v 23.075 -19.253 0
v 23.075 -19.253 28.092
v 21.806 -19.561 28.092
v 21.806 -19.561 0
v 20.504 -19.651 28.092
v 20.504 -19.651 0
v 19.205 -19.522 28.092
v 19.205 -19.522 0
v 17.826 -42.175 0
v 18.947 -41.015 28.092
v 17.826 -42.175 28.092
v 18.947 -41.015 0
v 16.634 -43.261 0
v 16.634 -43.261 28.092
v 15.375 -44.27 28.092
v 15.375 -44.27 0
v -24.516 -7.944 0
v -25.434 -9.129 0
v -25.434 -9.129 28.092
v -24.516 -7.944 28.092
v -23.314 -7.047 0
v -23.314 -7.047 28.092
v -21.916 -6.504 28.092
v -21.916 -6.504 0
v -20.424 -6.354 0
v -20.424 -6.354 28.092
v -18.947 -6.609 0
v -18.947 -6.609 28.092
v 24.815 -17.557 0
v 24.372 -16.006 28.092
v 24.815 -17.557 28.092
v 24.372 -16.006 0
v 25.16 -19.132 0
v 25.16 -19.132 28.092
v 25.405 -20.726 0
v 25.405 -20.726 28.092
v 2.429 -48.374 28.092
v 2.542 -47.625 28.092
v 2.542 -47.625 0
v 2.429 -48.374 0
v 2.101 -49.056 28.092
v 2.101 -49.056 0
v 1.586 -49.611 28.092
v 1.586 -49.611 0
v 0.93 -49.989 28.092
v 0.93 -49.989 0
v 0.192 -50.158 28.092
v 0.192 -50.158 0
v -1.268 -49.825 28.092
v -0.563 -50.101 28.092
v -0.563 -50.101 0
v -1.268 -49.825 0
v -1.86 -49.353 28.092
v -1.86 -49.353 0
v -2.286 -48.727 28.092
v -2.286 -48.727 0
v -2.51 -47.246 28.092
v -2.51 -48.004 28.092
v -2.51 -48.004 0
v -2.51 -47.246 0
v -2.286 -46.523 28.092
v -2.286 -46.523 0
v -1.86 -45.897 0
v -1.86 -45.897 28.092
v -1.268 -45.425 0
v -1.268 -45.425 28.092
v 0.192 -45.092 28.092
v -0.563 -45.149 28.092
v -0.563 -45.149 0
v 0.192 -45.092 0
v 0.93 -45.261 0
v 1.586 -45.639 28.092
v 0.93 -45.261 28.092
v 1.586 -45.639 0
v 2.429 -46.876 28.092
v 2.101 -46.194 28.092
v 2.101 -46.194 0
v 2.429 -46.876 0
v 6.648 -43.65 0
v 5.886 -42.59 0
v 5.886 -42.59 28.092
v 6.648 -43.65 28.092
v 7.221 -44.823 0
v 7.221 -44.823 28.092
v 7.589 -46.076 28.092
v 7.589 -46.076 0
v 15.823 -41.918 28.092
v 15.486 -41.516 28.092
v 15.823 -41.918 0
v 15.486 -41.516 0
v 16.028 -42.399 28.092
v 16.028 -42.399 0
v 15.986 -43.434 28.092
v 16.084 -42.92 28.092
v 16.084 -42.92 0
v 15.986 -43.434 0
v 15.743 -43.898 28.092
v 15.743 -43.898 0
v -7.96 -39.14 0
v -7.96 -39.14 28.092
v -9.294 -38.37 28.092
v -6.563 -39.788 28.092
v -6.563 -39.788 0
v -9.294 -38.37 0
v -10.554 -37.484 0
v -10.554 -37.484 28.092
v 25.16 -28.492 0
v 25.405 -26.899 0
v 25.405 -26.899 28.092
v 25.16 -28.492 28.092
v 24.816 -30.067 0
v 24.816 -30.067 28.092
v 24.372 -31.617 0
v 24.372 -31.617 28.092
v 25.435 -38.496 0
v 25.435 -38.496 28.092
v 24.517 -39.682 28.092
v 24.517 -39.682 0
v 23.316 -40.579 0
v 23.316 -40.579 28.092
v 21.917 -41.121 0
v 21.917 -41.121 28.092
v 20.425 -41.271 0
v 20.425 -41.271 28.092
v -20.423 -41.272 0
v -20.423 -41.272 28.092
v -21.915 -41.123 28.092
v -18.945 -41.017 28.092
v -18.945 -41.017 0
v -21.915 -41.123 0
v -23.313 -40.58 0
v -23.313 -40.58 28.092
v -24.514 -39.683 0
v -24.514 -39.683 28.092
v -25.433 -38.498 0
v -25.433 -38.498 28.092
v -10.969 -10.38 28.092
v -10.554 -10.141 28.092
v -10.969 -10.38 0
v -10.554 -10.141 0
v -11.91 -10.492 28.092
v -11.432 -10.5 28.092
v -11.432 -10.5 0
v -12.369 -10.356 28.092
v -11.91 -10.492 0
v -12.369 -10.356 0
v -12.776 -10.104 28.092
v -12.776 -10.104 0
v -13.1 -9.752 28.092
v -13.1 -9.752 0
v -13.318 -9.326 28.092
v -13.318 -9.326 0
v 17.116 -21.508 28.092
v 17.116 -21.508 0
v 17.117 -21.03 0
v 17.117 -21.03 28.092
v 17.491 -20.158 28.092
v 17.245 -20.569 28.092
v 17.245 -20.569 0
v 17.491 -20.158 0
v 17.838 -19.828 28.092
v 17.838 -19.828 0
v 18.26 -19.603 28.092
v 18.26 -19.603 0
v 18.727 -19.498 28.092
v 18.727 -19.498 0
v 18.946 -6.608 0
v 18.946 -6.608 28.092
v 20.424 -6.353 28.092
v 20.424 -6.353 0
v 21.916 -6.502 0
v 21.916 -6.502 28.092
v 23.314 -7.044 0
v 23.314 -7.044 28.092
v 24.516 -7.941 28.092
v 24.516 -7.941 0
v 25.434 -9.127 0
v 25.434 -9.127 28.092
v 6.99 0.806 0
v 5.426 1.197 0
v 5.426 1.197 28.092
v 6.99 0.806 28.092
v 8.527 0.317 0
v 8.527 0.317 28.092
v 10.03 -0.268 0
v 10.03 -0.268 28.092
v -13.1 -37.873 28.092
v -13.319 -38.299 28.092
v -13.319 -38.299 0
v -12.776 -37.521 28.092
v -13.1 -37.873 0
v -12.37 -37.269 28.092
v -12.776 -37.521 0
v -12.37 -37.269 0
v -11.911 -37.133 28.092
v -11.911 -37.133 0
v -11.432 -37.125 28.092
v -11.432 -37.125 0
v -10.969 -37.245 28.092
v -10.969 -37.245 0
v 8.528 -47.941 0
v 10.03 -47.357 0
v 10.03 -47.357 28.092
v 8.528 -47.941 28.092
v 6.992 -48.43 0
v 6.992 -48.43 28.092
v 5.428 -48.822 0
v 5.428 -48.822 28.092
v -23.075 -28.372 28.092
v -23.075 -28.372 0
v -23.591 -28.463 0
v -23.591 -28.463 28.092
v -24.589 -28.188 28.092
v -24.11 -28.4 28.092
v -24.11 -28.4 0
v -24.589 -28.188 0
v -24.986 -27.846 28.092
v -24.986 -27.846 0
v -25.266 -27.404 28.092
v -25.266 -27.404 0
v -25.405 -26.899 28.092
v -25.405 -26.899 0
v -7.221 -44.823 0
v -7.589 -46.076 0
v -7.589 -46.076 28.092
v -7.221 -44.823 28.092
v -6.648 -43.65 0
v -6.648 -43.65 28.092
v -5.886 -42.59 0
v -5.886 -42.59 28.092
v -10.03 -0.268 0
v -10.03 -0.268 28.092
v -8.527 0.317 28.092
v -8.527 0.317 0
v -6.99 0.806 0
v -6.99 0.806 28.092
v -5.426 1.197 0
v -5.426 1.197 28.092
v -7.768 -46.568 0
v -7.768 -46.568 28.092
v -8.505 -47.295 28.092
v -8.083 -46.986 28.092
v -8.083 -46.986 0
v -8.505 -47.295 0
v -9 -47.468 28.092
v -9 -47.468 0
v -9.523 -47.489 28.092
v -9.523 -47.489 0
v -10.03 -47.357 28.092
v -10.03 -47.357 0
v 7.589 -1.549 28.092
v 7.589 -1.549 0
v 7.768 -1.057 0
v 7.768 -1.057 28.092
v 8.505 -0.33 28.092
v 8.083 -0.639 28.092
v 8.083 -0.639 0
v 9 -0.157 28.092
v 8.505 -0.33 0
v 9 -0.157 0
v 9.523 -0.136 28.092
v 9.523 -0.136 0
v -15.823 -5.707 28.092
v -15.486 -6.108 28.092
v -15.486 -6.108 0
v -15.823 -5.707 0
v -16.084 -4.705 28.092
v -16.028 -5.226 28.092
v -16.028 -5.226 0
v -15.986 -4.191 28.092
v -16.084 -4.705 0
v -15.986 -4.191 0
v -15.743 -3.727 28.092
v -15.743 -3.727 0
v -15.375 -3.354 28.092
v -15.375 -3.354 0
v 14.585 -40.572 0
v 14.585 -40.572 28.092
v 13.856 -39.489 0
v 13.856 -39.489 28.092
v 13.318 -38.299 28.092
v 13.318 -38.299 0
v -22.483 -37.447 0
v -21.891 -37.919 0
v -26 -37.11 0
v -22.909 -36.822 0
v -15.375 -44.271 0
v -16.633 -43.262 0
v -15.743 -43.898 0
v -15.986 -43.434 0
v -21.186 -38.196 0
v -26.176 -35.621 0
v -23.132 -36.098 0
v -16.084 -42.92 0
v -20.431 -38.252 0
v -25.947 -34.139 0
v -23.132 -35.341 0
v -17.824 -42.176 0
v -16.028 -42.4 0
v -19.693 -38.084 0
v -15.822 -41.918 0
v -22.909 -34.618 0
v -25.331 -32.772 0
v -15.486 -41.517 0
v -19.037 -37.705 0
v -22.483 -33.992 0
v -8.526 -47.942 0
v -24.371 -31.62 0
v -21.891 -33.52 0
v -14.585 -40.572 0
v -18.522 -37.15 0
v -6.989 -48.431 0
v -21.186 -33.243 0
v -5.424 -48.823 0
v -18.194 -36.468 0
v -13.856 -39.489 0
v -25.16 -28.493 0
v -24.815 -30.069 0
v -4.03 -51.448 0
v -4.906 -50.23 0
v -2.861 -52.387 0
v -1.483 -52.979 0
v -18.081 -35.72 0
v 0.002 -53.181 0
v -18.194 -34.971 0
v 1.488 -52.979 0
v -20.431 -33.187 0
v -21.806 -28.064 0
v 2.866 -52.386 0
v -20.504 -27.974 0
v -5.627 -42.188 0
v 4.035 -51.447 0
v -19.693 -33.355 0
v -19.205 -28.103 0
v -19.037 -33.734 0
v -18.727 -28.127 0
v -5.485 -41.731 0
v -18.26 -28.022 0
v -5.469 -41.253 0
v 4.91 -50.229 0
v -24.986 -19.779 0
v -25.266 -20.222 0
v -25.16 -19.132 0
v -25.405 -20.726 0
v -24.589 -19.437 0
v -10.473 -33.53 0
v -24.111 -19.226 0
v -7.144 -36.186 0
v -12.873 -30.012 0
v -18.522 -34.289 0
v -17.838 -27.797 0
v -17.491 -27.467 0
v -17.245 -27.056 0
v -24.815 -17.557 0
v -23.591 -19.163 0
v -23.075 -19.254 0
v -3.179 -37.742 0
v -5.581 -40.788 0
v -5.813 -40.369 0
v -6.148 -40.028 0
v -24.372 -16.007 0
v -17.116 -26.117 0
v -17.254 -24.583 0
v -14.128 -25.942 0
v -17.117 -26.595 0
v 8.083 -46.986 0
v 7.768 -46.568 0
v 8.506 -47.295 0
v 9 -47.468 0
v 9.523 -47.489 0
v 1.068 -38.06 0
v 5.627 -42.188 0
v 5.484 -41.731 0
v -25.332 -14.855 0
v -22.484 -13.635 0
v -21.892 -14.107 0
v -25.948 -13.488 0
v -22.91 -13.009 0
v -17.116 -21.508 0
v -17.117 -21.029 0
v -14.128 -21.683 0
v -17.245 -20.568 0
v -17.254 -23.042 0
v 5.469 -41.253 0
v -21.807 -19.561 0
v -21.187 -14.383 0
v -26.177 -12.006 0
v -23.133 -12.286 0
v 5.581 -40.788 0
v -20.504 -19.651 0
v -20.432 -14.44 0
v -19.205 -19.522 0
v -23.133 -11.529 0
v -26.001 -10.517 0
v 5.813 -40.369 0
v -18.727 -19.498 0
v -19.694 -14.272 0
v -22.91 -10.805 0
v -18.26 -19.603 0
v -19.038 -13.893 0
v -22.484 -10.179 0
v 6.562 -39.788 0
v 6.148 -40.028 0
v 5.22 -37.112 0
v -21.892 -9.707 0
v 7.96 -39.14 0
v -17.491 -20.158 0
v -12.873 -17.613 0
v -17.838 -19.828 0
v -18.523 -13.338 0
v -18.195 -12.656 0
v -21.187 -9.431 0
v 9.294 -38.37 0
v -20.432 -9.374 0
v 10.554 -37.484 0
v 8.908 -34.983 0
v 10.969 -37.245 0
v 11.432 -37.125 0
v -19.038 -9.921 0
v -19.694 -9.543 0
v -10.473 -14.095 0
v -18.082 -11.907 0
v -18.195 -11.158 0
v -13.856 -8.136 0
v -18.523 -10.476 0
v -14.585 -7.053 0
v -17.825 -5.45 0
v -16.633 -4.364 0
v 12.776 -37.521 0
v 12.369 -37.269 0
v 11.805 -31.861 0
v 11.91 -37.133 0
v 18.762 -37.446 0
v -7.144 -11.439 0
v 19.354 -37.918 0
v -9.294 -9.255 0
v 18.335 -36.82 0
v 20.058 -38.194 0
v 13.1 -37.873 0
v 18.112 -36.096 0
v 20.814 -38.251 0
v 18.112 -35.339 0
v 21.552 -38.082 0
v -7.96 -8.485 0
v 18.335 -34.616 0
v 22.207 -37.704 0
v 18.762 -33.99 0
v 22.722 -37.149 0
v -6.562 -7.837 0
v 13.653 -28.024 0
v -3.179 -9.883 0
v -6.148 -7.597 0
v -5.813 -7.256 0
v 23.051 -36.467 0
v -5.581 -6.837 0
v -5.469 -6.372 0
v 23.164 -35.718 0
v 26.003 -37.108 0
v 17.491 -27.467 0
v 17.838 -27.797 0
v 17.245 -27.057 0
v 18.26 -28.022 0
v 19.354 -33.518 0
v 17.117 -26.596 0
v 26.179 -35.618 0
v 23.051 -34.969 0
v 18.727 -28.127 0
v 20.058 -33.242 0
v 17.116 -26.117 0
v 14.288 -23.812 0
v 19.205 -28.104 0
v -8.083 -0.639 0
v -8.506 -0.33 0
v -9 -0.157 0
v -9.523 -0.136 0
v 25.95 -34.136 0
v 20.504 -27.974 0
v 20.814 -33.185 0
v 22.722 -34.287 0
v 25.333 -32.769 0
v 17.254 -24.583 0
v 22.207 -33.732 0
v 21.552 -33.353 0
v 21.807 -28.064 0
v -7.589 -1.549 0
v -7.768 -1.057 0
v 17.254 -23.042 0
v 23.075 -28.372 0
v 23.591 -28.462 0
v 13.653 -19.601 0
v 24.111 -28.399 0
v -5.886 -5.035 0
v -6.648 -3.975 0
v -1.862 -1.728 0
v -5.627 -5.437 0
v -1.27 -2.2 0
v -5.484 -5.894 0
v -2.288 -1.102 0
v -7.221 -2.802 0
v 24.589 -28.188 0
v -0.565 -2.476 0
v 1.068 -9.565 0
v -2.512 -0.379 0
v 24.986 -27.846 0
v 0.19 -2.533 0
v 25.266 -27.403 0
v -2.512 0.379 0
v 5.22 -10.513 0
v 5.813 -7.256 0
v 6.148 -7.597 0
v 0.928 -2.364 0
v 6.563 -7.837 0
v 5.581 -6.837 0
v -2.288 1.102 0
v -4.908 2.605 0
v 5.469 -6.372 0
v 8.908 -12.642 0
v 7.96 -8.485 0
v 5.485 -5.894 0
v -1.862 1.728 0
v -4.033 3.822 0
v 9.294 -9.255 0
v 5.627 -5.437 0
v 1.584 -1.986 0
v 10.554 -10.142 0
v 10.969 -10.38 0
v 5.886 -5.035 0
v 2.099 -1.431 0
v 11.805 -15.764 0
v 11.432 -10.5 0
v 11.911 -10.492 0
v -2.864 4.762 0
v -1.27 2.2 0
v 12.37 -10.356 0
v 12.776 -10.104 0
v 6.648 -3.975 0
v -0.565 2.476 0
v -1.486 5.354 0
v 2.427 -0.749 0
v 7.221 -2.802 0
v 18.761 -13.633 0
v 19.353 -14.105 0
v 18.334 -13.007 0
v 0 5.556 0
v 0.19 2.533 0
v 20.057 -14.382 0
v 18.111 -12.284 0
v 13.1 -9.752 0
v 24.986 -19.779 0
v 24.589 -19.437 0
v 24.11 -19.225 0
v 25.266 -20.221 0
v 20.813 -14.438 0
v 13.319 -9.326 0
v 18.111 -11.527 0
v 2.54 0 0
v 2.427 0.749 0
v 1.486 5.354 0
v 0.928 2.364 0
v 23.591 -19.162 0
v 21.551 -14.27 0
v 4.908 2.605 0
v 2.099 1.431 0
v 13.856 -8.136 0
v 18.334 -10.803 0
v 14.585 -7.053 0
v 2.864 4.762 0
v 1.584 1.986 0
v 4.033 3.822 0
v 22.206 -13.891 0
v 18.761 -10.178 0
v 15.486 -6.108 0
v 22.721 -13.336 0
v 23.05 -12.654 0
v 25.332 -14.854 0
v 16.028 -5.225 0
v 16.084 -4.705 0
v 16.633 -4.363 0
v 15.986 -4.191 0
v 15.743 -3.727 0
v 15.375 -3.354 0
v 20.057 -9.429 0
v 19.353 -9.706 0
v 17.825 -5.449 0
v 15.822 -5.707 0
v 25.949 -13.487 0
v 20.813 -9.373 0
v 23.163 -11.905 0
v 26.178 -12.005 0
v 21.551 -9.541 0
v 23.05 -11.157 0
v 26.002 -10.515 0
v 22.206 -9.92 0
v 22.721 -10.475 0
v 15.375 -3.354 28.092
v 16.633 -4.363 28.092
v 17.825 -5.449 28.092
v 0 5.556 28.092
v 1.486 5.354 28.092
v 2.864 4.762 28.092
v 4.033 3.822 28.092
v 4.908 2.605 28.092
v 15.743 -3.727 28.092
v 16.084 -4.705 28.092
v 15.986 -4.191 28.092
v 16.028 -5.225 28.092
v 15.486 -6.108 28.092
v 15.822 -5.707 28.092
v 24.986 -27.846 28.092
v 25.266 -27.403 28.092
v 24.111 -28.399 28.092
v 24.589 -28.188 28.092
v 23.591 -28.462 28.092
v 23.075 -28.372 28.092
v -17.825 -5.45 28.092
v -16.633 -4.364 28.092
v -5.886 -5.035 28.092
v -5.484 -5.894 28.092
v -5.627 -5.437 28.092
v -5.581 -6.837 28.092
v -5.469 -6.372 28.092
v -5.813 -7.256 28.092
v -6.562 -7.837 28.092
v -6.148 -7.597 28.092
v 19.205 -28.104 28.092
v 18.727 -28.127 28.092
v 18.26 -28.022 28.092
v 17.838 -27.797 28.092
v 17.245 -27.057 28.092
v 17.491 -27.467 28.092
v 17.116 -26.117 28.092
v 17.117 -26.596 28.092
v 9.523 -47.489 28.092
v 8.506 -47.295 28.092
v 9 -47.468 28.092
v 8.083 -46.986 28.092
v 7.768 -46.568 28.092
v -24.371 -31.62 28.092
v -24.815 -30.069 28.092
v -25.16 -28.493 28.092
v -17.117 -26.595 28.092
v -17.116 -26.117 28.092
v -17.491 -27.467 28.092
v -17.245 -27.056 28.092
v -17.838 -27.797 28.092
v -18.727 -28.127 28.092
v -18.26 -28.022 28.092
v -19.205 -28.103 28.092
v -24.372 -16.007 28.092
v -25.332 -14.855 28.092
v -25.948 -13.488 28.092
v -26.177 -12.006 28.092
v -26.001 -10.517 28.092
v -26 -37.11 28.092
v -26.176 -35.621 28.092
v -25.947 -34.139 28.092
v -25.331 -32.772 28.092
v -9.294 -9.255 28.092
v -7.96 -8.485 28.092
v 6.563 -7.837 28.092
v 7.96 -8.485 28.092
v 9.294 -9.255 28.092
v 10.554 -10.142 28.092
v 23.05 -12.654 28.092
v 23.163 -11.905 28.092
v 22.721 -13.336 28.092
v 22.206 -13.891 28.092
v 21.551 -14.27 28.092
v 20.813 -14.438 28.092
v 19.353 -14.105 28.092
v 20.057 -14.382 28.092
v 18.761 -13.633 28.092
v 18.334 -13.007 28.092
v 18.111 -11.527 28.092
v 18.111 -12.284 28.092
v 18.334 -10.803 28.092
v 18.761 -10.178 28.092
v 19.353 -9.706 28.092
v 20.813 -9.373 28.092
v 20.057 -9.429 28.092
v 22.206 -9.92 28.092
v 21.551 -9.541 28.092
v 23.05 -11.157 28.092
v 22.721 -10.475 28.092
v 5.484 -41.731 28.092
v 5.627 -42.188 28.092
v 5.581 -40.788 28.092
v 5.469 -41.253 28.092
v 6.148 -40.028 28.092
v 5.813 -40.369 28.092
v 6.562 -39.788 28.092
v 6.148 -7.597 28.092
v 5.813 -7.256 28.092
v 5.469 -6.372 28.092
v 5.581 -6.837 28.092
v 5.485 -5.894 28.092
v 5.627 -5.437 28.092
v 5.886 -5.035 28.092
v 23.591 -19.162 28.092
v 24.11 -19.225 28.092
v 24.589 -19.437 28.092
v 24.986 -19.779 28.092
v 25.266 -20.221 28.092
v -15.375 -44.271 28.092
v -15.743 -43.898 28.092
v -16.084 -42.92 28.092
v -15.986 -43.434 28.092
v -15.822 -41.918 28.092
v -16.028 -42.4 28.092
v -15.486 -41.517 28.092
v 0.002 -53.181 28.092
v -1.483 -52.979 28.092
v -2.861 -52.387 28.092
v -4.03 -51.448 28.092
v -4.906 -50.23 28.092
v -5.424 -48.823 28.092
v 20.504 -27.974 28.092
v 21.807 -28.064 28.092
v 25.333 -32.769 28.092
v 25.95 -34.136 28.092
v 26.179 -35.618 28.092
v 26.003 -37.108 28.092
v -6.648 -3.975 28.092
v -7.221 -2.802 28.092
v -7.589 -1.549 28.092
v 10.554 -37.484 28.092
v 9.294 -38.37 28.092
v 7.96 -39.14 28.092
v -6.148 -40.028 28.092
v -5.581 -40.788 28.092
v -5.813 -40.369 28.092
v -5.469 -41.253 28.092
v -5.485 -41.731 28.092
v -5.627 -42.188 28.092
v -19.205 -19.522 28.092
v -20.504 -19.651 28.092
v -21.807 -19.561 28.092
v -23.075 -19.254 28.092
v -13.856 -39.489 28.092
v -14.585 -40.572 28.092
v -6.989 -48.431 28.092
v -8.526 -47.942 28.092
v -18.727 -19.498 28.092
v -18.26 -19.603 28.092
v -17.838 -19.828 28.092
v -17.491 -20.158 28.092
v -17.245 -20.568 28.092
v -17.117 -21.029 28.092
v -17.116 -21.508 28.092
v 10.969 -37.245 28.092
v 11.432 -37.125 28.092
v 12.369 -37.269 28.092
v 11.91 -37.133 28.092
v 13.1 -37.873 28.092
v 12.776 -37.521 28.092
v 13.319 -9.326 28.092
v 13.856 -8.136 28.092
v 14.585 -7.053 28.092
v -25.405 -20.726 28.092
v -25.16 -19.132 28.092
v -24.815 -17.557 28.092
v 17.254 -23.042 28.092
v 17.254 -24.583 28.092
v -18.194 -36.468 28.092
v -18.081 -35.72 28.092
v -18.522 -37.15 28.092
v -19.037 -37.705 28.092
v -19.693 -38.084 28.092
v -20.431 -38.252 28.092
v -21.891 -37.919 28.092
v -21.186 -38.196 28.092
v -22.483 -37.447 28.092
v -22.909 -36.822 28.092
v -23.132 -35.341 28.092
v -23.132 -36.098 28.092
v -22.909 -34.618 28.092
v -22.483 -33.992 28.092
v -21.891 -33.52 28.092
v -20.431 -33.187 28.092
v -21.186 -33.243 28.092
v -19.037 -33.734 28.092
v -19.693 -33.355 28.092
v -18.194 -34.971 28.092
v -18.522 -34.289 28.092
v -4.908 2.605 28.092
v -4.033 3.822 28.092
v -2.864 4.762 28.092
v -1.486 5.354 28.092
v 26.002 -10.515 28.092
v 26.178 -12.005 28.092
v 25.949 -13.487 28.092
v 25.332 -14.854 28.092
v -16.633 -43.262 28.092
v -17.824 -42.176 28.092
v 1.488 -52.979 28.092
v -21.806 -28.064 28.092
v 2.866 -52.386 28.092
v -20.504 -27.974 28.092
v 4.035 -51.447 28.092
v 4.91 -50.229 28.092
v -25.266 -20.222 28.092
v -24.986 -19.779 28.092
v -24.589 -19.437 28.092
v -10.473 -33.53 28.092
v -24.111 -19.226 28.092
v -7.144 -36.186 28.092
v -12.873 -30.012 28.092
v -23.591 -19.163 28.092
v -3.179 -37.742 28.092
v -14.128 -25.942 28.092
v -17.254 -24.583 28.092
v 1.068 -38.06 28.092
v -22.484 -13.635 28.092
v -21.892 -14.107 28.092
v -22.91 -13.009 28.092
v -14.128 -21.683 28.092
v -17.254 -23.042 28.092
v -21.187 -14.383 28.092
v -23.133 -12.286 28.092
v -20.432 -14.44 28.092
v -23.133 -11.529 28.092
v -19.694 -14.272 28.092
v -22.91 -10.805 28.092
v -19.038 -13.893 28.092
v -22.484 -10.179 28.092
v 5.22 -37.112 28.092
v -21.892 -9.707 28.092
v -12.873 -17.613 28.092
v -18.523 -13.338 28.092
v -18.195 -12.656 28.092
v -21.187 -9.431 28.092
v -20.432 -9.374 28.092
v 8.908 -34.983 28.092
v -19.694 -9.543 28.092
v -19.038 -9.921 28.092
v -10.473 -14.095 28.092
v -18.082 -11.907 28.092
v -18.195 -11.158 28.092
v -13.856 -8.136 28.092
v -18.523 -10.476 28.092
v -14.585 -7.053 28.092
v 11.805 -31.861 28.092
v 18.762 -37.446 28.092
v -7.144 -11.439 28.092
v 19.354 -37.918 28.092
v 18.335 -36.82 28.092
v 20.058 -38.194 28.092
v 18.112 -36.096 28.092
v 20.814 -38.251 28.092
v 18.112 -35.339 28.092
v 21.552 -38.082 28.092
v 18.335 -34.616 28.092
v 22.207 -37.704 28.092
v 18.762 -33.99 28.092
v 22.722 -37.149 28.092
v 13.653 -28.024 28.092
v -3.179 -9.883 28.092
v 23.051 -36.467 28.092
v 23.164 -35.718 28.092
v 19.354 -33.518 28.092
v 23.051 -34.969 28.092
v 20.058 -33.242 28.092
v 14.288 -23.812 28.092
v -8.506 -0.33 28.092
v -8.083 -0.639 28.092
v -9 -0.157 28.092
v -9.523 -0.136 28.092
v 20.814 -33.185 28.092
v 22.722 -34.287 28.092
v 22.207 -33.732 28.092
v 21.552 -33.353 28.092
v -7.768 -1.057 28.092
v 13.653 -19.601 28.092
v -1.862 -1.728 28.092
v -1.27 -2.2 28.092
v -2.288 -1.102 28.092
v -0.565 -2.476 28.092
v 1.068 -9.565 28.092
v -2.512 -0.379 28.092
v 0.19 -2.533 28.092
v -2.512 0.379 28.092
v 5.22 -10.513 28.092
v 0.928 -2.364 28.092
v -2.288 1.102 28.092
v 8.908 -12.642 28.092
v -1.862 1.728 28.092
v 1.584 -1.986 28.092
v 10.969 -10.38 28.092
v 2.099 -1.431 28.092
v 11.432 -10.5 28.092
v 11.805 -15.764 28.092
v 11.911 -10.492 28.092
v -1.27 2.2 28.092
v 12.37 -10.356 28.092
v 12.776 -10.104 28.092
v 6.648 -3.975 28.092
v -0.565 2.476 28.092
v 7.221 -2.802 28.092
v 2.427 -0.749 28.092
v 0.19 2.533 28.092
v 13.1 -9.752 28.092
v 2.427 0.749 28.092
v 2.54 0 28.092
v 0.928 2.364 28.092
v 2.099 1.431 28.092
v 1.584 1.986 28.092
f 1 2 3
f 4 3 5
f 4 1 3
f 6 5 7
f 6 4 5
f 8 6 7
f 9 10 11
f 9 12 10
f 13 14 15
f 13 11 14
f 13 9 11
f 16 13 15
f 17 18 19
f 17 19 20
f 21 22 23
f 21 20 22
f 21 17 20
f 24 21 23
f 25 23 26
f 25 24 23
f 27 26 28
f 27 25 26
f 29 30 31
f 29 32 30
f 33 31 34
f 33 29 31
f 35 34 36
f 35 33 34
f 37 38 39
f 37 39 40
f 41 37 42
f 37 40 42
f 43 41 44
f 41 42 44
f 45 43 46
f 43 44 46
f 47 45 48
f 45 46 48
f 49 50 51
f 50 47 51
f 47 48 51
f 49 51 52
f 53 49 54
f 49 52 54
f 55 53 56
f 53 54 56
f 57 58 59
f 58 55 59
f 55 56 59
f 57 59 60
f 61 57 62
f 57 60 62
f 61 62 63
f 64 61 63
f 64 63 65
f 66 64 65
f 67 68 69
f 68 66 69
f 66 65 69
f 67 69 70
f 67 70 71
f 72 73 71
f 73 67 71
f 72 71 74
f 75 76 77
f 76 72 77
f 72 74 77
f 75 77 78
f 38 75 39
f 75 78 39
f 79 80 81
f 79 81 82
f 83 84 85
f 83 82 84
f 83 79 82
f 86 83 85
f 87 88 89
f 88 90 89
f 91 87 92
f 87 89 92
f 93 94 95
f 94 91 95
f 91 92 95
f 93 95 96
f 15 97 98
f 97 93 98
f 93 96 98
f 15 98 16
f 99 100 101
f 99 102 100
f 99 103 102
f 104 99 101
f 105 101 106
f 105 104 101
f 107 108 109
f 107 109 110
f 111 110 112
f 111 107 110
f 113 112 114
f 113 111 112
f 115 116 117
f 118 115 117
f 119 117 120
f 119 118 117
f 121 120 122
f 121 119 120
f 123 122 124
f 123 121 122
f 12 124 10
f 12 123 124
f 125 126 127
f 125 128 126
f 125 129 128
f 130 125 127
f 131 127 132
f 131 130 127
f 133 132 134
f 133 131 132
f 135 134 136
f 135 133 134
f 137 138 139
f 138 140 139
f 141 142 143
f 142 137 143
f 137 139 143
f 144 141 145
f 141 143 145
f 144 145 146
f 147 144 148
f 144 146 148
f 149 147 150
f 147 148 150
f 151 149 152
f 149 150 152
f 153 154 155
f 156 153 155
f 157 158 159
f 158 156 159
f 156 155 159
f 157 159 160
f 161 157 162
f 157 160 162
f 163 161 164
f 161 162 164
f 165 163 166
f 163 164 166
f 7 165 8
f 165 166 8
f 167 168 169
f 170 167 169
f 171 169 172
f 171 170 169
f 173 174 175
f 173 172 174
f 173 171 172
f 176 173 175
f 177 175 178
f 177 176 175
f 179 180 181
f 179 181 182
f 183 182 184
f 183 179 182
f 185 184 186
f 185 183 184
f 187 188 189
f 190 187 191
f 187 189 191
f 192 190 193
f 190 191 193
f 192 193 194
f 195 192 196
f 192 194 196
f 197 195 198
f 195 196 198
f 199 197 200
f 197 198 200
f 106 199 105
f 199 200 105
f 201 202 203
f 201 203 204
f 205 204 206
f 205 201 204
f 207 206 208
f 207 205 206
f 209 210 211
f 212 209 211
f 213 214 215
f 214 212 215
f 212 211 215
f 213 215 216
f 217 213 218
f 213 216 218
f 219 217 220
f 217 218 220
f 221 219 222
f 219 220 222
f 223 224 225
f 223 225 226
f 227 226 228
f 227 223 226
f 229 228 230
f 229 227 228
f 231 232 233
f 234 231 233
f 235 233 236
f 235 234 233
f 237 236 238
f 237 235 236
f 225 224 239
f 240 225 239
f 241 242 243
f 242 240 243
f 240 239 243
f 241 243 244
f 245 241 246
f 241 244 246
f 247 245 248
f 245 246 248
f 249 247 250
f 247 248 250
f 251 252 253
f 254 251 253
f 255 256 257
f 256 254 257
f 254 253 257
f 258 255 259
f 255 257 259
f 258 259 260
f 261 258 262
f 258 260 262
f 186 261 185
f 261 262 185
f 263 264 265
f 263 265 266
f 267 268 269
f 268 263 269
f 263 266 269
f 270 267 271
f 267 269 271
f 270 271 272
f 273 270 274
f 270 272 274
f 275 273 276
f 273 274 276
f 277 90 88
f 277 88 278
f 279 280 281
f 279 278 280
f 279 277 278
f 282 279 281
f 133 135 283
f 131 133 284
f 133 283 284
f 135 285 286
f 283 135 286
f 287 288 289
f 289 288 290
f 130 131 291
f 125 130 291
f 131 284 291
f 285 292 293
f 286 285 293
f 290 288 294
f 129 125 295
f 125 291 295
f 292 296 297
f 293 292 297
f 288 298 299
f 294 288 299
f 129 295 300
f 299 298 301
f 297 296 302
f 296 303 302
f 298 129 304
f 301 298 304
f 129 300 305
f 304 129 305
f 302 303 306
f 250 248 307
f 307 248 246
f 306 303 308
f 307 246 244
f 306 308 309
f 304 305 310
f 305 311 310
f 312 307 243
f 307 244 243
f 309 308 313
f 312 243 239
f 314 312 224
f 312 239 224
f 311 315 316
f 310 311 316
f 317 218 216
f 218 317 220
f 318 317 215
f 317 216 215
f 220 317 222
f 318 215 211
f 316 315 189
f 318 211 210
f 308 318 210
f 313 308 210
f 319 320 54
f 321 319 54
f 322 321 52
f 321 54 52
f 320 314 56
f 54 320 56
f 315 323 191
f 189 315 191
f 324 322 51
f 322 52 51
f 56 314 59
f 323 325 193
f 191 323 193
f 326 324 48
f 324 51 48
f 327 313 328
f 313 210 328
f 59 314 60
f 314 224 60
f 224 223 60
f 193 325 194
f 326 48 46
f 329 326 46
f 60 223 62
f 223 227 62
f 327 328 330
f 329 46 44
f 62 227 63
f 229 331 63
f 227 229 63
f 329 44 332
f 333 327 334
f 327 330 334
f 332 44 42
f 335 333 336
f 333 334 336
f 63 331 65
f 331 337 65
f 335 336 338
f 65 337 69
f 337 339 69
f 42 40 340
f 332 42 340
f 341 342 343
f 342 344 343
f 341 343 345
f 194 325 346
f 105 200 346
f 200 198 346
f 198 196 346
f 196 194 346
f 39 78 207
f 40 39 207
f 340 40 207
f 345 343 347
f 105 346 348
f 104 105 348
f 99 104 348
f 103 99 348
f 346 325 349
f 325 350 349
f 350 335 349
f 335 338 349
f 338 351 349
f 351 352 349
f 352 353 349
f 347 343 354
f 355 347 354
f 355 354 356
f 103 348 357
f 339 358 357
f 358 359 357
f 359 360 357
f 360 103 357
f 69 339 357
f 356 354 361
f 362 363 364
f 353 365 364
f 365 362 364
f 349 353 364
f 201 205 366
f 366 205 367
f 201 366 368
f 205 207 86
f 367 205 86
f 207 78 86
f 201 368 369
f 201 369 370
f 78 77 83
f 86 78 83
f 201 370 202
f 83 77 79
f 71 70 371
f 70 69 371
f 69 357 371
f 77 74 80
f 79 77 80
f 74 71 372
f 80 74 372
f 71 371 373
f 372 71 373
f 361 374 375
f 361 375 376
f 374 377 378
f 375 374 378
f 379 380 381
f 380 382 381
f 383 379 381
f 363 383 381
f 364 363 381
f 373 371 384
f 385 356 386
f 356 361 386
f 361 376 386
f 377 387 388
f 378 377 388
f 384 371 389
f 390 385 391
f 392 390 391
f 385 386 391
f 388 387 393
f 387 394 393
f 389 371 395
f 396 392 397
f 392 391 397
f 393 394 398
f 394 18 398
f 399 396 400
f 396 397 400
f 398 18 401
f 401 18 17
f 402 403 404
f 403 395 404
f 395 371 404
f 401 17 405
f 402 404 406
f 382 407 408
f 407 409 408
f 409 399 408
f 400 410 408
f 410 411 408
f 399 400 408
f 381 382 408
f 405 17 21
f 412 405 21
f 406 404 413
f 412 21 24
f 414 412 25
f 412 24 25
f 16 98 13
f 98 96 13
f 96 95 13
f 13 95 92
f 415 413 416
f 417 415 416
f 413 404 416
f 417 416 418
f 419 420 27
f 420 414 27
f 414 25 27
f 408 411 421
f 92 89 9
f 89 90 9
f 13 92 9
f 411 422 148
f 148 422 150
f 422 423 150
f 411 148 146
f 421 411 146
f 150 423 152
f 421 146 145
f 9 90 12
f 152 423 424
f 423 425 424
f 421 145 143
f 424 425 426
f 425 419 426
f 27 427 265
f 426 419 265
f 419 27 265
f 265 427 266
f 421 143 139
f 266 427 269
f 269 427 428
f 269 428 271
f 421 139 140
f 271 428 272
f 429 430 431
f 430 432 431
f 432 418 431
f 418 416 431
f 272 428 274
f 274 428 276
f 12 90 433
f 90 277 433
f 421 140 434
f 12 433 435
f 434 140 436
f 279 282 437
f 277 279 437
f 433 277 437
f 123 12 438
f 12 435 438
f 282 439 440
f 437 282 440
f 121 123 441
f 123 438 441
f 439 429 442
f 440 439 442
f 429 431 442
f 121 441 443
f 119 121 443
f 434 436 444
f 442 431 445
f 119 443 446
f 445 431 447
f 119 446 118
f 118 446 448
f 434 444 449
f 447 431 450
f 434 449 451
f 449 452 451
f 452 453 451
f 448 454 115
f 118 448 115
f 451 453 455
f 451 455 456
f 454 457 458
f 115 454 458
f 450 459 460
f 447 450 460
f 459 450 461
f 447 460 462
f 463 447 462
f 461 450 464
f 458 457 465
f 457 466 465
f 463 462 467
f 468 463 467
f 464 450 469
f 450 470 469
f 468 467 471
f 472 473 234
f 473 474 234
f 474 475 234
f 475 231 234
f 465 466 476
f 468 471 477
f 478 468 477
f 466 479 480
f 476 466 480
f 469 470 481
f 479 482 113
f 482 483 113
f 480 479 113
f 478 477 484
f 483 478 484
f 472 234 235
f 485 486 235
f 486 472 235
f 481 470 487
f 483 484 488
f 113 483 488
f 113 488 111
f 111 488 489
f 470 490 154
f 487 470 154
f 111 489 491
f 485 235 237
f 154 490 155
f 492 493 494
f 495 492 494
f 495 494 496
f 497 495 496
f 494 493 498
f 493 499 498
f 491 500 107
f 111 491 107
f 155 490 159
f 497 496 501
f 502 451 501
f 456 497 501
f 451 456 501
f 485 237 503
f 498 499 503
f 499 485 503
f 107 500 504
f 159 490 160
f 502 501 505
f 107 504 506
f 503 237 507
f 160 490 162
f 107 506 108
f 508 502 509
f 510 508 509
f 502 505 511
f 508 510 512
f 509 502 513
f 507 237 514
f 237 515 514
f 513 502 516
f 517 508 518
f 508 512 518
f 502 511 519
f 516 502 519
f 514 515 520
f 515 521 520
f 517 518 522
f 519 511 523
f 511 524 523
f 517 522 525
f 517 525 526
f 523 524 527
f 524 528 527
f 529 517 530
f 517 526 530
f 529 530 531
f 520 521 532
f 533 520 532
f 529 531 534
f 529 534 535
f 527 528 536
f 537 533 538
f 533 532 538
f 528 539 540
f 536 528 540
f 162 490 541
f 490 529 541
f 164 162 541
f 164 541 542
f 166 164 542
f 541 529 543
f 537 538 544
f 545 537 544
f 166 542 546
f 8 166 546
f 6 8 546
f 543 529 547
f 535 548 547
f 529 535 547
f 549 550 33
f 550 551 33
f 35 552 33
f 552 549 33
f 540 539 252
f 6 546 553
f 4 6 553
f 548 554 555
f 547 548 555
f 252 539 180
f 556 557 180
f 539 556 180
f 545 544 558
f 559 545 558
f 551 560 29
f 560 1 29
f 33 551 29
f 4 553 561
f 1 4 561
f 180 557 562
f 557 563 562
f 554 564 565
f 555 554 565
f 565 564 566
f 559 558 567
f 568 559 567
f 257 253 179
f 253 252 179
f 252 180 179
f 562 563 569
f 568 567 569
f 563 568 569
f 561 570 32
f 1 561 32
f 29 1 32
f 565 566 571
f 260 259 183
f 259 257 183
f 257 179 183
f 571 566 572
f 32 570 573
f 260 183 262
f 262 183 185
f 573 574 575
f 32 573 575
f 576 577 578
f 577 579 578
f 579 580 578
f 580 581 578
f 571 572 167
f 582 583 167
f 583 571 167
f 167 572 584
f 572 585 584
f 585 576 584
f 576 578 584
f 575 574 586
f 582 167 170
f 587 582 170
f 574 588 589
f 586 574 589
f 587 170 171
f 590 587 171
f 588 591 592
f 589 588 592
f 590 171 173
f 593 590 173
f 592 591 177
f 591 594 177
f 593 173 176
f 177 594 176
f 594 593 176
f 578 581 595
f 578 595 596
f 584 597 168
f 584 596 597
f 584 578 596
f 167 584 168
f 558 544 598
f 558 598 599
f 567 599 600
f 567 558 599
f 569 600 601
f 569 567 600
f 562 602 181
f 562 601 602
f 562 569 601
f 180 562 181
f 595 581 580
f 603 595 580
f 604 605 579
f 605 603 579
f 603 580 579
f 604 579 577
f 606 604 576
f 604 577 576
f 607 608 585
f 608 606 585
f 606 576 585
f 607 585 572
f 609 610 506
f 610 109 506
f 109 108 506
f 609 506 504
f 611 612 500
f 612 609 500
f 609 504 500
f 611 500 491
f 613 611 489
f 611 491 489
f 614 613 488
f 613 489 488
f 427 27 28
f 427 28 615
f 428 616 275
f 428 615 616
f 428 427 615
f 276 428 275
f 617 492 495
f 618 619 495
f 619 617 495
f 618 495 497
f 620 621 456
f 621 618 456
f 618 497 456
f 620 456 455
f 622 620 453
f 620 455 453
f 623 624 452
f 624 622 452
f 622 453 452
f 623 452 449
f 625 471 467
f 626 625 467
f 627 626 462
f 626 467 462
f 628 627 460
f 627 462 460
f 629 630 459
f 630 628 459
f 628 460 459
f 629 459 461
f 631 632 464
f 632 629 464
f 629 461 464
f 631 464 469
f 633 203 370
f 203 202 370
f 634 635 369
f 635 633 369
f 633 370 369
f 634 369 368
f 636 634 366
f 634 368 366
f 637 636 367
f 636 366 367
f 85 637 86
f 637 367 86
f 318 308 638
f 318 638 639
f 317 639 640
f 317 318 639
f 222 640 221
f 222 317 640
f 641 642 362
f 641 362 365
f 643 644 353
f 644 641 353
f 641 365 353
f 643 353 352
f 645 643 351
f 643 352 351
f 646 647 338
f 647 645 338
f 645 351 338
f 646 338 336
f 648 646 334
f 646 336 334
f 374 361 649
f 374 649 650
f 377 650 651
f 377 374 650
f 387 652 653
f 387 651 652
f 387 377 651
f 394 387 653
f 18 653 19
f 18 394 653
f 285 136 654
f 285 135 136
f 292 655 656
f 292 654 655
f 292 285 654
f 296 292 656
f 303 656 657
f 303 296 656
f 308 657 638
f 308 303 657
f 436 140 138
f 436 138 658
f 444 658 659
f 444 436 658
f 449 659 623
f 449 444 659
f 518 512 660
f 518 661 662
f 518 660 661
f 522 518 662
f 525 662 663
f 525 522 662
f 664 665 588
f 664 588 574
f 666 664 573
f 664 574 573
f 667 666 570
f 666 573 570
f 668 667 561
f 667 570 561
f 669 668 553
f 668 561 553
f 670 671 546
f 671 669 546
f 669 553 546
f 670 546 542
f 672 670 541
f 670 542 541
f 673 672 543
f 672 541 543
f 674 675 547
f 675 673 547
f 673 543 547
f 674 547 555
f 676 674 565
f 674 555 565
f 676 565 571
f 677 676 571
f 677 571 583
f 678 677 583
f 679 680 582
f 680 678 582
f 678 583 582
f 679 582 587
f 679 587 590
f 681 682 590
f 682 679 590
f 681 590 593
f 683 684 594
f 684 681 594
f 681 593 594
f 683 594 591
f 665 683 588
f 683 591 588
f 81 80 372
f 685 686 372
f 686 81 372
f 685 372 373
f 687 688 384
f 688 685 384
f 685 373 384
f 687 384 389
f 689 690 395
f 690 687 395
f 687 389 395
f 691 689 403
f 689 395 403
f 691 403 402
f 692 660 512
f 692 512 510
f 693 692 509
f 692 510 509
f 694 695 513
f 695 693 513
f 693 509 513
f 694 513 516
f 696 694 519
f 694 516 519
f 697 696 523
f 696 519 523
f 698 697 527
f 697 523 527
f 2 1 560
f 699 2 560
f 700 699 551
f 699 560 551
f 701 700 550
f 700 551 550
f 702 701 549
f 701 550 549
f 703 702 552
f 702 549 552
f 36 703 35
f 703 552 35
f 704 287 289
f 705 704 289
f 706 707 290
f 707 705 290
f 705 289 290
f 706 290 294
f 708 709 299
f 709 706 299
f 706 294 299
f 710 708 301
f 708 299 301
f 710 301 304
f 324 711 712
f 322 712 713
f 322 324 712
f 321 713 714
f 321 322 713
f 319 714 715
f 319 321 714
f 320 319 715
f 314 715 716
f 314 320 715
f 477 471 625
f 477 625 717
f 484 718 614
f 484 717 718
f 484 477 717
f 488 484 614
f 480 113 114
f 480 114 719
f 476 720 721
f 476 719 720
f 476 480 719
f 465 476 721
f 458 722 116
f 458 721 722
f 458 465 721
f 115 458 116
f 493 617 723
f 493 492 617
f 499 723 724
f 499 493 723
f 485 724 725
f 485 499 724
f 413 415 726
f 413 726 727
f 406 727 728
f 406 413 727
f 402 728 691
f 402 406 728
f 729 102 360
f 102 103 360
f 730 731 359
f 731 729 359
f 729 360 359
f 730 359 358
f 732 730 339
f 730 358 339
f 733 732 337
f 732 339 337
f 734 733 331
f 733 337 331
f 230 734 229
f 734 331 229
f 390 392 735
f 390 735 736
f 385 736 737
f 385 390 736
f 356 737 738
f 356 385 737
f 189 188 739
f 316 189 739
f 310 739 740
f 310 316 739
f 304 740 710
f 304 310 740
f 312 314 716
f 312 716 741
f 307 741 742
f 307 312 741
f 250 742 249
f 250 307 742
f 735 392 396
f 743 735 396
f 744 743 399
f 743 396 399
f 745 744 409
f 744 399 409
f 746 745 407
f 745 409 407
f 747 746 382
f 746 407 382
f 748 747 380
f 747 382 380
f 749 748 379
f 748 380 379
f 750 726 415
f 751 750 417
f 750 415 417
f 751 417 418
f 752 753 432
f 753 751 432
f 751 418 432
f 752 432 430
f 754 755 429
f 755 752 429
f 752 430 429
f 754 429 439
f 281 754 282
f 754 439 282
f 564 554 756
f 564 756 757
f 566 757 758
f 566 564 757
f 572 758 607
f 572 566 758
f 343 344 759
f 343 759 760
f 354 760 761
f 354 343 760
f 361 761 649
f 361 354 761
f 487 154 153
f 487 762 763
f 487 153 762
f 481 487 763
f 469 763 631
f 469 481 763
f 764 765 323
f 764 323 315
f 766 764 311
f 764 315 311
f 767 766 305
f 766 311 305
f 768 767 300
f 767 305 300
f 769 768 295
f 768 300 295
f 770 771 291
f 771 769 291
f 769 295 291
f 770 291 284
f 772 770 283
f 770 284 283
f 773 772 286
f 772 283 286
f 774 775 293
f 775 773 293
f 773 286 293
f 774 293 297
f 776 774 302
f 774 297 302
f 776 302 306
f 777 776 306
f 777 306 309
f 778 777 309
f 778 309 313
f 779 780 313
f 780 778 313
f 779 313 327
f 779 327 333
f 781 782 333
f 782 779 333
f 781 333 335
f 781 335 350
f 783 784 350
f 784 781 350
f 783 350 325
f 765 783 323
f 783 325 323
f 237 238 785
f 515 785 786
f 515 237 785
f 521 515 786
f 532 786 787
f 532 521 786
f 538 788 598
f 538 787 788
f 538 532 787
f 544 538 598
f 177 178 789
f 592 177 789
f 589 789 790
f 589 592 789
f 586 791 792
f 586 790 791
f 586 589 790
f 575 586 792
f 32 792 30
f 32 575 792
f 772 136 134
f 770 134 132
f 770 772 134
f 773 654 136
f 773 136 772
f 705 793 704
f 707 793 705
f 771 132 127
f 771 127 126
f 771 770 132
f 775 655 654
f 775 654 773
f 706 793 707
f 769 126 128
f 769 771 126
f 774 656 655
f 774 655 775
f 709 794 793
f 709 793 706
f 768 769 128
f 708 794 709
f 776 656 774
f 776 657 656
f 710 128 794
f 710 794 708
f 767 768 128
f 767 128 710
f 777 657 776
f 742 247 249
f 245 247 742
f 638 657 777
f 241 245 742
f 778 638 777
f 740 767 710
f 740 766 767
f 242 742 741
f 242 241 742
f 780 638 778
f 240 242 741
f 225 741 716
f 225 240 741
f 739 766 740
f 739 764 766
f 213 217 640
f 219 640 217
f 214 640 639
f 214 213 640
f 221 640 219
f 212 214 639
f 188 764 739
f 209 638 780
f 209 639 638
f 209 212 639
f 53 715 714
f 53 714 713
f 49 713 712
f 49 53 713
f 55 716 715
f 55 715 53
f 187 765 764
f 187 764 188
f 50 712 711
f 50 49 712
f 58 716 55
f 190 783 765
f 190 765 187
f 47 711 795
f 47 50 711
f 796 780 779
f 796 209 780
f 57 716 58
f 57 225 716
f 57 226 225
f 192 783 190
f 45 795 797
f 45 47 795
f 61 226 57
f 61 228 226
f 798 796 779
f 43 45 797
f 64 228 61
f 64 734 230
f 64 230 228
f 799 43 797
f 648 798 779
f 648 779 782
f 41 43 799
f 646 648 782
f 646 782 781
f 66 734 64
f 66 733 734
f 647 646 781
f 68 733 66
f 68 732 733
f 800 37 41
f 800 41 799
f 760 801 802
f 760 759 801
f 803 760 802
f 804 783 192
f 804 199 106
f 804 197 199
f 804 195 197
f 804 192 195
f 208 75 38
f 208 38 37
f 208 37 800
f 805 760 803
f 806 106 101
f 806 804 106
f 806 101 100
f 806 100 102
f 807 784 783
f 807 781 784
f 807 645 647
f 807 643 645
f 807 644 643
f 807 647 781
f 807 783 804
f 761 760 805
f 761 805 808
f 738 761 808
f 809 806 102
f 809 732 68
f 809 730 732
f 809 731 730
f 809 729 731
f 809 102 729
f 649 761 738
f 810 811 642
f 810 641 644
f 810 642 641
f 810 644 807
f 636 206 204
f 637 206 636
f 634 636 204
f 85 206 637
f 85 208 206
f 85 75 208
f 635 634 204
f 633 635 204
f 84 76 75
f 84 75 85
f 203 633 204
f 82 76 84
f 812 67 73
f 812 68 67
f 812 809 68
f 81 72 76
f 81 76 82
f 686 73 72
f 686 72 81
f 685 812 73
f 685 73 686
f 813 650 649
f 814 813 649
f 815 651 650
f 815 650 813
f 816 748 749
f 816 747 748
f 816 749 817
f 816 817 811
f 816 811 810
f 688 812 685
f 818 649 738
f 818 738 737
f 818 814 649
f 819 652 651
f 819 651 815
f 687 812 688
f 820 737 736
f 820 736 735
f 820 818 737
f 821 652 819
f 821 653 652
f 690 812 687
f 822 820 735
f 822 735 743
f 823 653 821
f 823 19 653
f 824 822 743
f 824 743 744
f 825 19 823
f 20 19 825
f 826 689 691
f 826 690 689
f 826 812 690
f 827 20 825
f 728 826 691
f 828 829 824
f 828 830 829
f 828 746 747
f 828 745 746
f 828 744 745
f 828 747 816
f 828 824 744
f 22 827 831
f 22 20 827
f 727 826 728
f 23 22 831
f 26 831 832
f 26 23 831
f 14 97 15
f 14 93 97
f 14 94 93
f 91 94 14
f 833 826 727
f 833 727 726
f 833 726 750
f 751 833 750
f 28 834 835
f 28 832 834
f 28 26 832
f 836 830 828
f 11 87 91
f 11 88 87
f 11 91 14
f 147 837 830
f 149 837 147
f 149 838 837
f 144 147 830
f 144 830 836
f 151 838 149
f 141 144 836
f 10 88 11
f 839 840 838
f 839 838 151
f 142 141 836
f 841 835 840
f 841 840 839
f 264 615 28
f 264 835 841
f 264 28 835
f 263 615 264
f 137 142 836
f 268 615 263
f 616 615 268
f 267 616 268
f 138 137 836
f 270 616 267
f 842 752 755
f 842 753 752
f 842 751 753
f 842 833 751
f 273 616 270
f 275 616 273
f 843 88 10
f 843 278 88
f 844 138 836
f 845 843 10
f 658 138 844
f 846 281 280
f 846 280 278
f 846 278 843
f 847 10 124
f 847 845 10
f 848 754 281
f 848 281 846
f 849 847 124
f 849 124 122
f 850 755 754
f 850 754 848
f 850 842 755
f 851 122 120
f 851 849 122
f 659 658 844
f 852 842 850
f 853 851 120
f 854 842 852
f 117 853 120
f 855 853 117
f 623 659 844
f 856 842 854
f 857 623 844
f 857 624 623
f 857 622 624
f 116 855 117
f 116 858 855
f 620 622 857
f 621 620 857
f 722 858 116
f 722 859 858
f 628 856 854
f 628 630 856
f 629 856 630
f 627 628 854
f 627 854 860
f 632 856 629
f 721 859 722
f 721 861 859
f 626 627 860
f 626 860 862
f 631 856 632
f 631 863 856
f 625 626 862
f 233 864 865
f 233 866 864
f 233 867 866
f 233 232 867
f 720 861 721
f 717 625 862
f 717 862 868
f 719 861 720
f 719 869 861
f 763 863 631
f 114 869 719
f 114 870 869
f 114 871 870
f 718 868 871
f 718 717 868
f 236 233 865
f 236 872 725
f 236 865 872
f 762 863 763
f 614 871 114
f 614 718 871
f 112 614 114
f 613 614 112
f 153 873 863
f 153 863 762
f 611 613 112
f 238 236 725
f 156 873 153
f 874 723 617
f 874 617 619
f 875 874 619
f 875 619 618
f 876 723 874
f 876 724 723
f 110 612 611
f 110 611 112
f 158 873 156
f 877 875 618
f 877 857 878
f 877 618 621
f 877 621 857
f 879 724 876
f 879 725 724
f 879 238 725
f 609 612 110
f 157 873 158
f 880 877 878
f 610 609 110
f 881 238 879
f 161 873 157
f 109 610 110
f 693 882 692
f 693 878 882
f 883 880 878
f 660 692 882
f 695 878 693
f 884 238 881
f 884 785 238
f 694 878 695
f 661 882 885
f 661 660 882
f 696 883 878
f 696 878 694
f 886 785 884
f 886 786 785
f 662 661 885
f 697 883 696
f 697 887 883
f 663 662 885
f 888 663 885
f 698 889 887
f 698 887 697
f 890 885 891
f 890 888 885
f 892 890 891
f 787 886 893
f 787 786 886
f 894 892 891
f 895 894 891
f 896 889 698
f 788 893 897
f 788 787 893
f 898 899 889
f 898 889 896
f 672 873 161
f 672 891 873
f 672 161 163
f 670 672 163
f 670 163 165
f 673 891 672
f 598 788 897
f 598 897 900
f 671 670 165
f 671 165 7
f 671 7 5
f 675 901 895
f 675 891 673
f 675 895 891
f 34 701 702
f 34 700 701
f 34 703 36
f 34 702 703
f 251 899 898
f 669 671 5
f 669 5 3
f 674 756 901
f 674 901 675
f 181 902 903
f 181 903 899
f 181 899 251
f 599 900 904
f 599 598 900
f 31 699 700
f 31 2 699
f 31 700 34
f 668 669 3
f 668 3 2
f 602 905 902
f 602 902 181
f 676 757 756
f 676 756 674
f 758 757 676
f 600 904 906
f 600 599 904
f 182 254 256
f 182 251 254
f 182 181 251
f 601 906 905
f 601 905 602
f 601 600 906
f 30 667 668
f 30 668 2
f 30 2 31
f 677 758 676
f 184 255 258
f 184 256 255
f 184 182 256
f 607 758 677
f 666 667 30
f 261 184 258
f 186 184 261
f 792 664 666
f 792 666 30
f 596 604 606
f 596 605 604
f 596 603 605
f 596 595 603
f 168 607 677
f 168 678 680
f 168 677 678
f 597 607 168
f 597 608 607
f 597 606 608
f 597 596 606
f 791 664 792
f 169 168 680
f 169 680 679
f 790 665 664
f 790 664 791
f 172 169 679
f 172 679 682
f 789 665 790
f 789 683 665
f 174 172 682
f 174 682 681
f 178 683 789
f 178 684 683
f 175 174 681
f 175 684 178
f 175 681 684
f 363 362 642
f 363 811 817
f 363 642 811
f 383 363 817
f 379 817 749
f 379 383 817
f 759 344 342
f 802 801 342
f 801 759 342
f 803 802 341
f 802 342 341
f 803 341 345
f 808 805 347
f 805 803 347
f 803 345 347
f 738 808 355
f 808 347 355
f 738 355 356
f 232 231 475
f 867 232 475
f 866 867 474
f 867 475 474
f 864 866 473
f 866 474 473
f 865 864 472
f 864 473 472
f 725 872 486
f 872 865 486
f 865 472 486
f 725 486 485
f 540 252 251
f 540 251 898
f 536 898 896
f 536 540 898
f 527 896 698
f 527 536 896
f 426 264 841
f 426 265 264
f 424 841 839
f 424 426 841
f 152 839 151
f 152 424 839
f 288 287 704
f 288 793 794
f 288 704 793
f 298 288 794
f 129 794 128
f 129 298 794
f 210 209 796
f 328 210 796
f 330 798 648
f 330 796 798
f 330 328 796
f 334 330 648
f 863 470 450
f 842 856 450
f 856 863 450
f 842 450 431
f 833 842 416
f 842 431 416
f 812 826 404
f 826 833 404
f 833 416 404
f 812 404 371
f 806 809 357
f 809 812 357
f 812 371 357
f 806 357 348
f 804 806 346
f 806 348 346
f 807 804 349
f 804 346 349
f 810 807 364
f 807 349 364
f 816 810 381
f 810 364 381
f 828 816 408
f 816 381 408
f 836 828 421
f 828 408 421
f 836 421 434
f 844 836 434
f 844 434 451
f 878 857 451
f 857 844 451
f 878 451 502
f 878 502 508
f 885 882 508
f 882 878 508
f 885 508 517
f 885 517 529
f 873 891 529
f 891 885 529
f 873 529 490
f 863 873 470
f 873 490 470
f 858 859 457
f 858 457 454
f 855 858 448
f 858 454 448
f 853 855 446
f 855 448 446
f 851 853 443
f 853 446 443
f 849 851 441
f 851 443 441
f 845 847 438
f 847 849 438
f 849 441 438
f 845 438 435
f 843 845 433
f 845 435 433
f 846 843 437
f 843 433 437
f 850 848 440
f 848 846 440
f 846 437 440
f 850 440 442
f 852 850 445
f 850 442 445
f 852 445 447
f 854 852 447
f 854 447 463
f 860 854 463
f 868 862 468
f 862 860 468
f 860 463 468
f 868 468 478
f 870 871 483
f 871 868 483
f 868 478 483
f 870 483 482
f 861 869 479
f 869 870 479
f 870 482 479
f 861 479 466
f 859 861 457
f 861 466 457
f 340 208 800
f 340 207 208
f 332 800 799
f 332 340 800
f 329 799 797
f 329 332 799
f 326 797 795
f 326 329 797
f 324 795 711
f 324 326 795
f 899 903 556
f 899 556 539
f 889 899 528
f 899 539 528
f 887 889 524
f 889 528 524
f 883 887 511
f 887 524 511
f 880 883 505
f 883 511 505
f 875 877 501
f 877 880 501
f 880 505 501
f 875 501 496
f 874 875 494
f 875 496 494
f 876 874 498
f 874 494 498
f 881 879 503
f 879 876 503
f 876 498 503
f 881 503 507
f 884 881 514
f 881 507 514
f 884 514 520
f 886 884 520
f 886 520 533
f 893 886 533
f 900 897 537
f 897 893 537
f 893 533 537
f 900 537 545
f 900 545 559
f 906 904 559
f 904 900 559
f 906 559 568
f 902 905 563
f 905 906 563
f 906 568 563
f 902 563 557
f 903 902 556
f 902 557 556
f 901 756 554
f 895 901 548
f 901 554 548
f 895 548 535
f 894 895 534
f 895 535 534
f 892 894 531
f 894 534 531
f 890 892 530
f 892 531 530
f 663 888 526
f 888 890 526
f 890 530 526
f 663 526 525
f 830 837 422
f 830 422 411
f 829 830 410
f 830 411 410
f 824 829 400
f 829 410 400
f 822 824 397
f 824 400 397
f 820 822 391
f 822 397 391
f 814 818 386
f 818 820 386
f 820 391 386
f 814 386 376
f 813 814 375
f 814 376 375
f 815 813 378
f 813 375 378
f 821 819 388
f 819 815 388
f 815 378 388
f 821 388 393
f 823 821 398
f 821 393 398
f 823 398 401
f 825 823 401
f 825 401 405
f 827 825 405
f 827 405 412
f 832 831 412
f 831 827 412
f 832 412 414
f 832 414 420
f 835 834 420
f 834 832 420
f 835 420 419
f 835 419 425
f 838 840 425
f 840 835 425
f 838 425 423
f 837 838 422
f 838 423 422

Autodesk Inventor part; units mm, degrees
ref_plane "YZ Plane" through (0, 0, 0) normal (1, 0, 0) x (0, 1, 0)
ref_plane "XZ Plane" through (0, 0, 0) normal (0, 1, 0) x (-1, 0, 0)
ref_plane "XY Plane" through (0, 0, 0) normal (0, 0, 1) x (1, 0, 0)
sketch "Sketch1" plane through (0, 0, 0) normal (0, 0, 1) x (1, 0, 0)
  arc A0 (24.3719, -16.0061) -> (18.9457, -6.6082) centre (20.6227, -11.9054) ccw
  arc A1 (18.9457, -6.6082) -> (15.375, -3.3543) centre (0, -23.8125) ccw
  arc A2 (15.4859, -6.1082) -> (15.375, -3.3543) centre (14.3062, -4.7765) ccw
  arc A3 (15.4859, -6.1082) -> (13.3187, -9.3259) centre (20.6222, -11.9062) ccw
  arc A4 (10.5541, -10.1415) -> (13.3187, -9.3259) centre (11.6413, -8.7333) ccw
  arc A5 (10.5541, -10.1415) -> (6.5626, -7.8369) centre (0, -23.8125) ccw
  arc A6 (5.8865, -5.0351) -> (6.5626, -7.8369) centre (7.2386, -6.1913) ccw
  arc A7 (5.8865, -5.0351) -> (7.5891, -1.5492) centre (-0.0005, -0.0009) ccw
  arc A8 (10.0295, -0.2681) -> (7.5891, -1.5492) centre (9.3323, -1.9049) ccw
  arc A9 (10.0295, -0.2681) -> (5.4257, 1.1973) centre (0, -23.8125) ccw
  arc A10 (5.4257, 1.1973) -> (-5.4257, 1.1973) centre (0, 0) ccw
  arc A11 (-5.4257, 1.1973) -> (-10.0298, -0.2683) centre (0, -23.8125) ccw
  arc A12 (-7.5894, -1.5492) -> (-10.0298, -0.2683) centre (-9.3326, -1.905) ccw
  arc A13 (-7.5894, -1.5492) -> (-5.8864, -5.0349) centre (0, 0) ccw
  arc A14 (-6.5624, -7.8369) -> (-5.8864, -5.0349) centre (-7.2384, -6.1912) ccw
  arc A15 (-6.5624, -7.8369) -> (-10.554, -10.1414) centre (0, -23.8125) ccw
  arc A16 (-13.3185, -9.326) -> (-10.554, -10.1414) centre (-11.6411, -8.7331) ccw
  arc A17 (-13.3185, -9.326) -> (-15.486, -6.1085) centre (-20.6217, -11.9071) ccw
  arc A18 (-15.3753, -3.3545) -> (-15.486, -6.1085) centre (-14.3064, -4.7767) ccw
  arc A19 (-15.3753, -3.3545) -> (-18.9467, -6.6093) centre (0, -23.8125) ccw
  arc A20 (-18.9467, -6.6093) -> (-24.3721, -16.0067) centre (-20.6217, -11.9071) ccw
  arc A21 (-24.3721, -16.0067) -> (-25.4048, -20.7264) centre (0, -23.8125) ccw
  arc A22 (-23.0753, -19.2535) -> (-25.4048, -20.7264) centre (-23.6387, -20.941) ccw
  arc A23 (-23.0753, -19.2535) -> (-19.2051, -19.5215) centre (-20.6222, -11.9063) ccw
  arc A24 (-17.1165, -21.5079) -> (-19.2051, -19.5215) centre (-18.8796, -21.2705) ccw
  arc A25 (-17.1165, -21.5079) -> (-17.1165, -26.1169) centre (0, -23.8125) ccw
  arc A26 (-19.2049, -28.1034) -> (-17.1165, -26.1169) centre (-18.8797, -26.3543) ccw
  arc A27 (-19.2049, -28.1034) -> (-23.0751, -28.3718) centre (-20.6212, -35.7187) ccw
  arc A28 (-25.4048, -26.8989) -> (-23.0751, -28.3718) centre (-23.6387, -26.6843) ccw
  arc A29 (-25.4048, -26.8989) -> (-24.3714, -31.6203) centre (0, -23.8125) ccw
  arc A30 (-24.3714, -31.6203) -> (-18.9453, -41.0172) centre (-20.6207, -35.7196) ccw
  arc A31 (-18.9453, -41.0172) -> (-15.375, -44.2707) centre (0, -23.8125) ccw
  arc A32 (-15.4859, -41.5168) -> (-15.375, -44.2707) centre (-14.3062, -42.8485) ccw
  arc A33 (-15.4859, -41.5168) -> (-13.3187, -38.2991) centre (-20.6222, -35.7188) ccw
  arc A34 (-10.5541, -37.4835) -> (-13.3187, -38.2991) centre (-11.6413, -38.8917) ccw
  arc A35 (-10.5541, -37.4835) -> (-6.5626, -39.7881) centre (0, -23.8125) ccw
  arc A36 (-5.8865, -42.5899) -> (-6.5626, -39.7881) centre (-7.2386, -41.4337) ccw
  arc A37 (-5.8865, -42.5899) -> (-7.5891, -46.0758) centre (0.0005, -47.6241) ccw
  arc A38 (-10.0295, -47.3569) -> (-7.5891, -46.0758) centre (-9.3323, -45.7201) ccw
  arc A39 (-10.0295, -47.3569) -> (-5.4236, -48.8227) centre (0, -23.8125) ccw
  arc A40 (-5.4236, -48.8227) -> (5.4278, -48.8218) centre (0.002, -47.625) ccw
  arc A41 (5.4278, -48.8218) -> (10.0298, -47.3567) centre (0, -23.8125) ccw
  arc A42 (7.5894, -46.0758) -> (10.0298, -47.3567) centre (9.3326, -45.72) ccw
  arc A43 (7.5894, -46.0758) -> (5.8864, -42.5901) centre (0, -47.625) ccw
  arc A44 (6.5624, -39.7881) -> (5.8864, -42.5901) centre (7.2384, -41.4338) ccw
  arc A45 (6.5624, -39.7881) -> (10.554, -37.4836) centre (0, -23.8125) ccw
  arc A46 (13.3185, -38.299) -> (10.554, -37.4836) centre (11.6411, -38.8919) ccw
  arc A47 (13.3185, -38.299) -> (15.486, -41.5165) centre (20.6217, -35.7179) ccw
  arc A48 (15.3753, -44.2705) -> (15.486, -41.5165) centre (14.3064, -42.8483) ccw
  arc A49 (15.3753, -44.2705) -> (18.9472, -41.0152) centre (0, -23.8125) ccw
  arc A50 (18.9472, -41.0152) -> (24.3725, -31.6169) centre (20.6237, -35.7179) ccw
  arc A51 (24.3725, -31.6169) -> (25.4048, -26.8986) centre (0, -23.8125) ccw
  arc A52 (23.0753, -28.3715) -> (25.4048, -26.8986) centre (23.6387, -26.684) ccw
  arc A53 (23.0753, -28.3715) -> (19.2051, -28.1035) centre (20.6222, -35.7187) ccw
  arc A54 (17.1165, -26.1171) -> (19.2051, -28.1035) centre (18.8796, -26.3545) ccw
  arc A55 (17.1165, -26.1171) -> (17.1165, -21.5081) centre (0, -23.8125) ccw
  arc A56 (19.2049, -19.5216) -> (17.1165, -21.5081) centre (18.8797, -21.2707) ccw
  arc A57 (19.2049, -19.5216) -> (23.0751, -19.2532) centre (20.6212, -11.9063) ccw
  arc A58 (25.4048, -20.7261) -> (23.0751, -19.2532) centre (23.6387, -20.9407) ccw
  arc A59 (25.4048, -20.7261) -> (24.3719, -16.0061) centre (0, -23.8125) ccw
  circle A60 centre (20.6227, -11.9054) radius 2.54
  circle A61 centre (20.6237, -35.7179) radius 2.54
  circle A62 centre (0.002, -47.625) radius 2.54
  circle A63 centre (-20.6207, -35.7196) radius 2.54
  circle A64 centre (-20.6217, -11.9071) radius 2.54
  circle A65 centre (0, 0) radius 2.54
  circle A66 centre (0, -23.8125) radius 14.2875
  circle A67 centre (0, -23.8125) radius 29.3688
extrude "Extrusion1" add sketch "Sketch1" along normal blind 28.0924 contours A59 A58 A57 A56 A55 A54 A53 A52 A51 A50 A49 A48 A47 A46 A45 A44 A43 A42 A41 A40 A39 A38 A37 A36 A35 A34 A33 A32 A31 A30 A29 A28 A27 A26 A25 A24 A23 A22 A21 A20 A19 A18 A17 A16 A15 A14 A13 A12 A11 A10 A9 A8 A7 A6 A5 A4 A3 A2 A1 A0
properties part number "back wheel spacer" material "PC/ABS Plastic"
